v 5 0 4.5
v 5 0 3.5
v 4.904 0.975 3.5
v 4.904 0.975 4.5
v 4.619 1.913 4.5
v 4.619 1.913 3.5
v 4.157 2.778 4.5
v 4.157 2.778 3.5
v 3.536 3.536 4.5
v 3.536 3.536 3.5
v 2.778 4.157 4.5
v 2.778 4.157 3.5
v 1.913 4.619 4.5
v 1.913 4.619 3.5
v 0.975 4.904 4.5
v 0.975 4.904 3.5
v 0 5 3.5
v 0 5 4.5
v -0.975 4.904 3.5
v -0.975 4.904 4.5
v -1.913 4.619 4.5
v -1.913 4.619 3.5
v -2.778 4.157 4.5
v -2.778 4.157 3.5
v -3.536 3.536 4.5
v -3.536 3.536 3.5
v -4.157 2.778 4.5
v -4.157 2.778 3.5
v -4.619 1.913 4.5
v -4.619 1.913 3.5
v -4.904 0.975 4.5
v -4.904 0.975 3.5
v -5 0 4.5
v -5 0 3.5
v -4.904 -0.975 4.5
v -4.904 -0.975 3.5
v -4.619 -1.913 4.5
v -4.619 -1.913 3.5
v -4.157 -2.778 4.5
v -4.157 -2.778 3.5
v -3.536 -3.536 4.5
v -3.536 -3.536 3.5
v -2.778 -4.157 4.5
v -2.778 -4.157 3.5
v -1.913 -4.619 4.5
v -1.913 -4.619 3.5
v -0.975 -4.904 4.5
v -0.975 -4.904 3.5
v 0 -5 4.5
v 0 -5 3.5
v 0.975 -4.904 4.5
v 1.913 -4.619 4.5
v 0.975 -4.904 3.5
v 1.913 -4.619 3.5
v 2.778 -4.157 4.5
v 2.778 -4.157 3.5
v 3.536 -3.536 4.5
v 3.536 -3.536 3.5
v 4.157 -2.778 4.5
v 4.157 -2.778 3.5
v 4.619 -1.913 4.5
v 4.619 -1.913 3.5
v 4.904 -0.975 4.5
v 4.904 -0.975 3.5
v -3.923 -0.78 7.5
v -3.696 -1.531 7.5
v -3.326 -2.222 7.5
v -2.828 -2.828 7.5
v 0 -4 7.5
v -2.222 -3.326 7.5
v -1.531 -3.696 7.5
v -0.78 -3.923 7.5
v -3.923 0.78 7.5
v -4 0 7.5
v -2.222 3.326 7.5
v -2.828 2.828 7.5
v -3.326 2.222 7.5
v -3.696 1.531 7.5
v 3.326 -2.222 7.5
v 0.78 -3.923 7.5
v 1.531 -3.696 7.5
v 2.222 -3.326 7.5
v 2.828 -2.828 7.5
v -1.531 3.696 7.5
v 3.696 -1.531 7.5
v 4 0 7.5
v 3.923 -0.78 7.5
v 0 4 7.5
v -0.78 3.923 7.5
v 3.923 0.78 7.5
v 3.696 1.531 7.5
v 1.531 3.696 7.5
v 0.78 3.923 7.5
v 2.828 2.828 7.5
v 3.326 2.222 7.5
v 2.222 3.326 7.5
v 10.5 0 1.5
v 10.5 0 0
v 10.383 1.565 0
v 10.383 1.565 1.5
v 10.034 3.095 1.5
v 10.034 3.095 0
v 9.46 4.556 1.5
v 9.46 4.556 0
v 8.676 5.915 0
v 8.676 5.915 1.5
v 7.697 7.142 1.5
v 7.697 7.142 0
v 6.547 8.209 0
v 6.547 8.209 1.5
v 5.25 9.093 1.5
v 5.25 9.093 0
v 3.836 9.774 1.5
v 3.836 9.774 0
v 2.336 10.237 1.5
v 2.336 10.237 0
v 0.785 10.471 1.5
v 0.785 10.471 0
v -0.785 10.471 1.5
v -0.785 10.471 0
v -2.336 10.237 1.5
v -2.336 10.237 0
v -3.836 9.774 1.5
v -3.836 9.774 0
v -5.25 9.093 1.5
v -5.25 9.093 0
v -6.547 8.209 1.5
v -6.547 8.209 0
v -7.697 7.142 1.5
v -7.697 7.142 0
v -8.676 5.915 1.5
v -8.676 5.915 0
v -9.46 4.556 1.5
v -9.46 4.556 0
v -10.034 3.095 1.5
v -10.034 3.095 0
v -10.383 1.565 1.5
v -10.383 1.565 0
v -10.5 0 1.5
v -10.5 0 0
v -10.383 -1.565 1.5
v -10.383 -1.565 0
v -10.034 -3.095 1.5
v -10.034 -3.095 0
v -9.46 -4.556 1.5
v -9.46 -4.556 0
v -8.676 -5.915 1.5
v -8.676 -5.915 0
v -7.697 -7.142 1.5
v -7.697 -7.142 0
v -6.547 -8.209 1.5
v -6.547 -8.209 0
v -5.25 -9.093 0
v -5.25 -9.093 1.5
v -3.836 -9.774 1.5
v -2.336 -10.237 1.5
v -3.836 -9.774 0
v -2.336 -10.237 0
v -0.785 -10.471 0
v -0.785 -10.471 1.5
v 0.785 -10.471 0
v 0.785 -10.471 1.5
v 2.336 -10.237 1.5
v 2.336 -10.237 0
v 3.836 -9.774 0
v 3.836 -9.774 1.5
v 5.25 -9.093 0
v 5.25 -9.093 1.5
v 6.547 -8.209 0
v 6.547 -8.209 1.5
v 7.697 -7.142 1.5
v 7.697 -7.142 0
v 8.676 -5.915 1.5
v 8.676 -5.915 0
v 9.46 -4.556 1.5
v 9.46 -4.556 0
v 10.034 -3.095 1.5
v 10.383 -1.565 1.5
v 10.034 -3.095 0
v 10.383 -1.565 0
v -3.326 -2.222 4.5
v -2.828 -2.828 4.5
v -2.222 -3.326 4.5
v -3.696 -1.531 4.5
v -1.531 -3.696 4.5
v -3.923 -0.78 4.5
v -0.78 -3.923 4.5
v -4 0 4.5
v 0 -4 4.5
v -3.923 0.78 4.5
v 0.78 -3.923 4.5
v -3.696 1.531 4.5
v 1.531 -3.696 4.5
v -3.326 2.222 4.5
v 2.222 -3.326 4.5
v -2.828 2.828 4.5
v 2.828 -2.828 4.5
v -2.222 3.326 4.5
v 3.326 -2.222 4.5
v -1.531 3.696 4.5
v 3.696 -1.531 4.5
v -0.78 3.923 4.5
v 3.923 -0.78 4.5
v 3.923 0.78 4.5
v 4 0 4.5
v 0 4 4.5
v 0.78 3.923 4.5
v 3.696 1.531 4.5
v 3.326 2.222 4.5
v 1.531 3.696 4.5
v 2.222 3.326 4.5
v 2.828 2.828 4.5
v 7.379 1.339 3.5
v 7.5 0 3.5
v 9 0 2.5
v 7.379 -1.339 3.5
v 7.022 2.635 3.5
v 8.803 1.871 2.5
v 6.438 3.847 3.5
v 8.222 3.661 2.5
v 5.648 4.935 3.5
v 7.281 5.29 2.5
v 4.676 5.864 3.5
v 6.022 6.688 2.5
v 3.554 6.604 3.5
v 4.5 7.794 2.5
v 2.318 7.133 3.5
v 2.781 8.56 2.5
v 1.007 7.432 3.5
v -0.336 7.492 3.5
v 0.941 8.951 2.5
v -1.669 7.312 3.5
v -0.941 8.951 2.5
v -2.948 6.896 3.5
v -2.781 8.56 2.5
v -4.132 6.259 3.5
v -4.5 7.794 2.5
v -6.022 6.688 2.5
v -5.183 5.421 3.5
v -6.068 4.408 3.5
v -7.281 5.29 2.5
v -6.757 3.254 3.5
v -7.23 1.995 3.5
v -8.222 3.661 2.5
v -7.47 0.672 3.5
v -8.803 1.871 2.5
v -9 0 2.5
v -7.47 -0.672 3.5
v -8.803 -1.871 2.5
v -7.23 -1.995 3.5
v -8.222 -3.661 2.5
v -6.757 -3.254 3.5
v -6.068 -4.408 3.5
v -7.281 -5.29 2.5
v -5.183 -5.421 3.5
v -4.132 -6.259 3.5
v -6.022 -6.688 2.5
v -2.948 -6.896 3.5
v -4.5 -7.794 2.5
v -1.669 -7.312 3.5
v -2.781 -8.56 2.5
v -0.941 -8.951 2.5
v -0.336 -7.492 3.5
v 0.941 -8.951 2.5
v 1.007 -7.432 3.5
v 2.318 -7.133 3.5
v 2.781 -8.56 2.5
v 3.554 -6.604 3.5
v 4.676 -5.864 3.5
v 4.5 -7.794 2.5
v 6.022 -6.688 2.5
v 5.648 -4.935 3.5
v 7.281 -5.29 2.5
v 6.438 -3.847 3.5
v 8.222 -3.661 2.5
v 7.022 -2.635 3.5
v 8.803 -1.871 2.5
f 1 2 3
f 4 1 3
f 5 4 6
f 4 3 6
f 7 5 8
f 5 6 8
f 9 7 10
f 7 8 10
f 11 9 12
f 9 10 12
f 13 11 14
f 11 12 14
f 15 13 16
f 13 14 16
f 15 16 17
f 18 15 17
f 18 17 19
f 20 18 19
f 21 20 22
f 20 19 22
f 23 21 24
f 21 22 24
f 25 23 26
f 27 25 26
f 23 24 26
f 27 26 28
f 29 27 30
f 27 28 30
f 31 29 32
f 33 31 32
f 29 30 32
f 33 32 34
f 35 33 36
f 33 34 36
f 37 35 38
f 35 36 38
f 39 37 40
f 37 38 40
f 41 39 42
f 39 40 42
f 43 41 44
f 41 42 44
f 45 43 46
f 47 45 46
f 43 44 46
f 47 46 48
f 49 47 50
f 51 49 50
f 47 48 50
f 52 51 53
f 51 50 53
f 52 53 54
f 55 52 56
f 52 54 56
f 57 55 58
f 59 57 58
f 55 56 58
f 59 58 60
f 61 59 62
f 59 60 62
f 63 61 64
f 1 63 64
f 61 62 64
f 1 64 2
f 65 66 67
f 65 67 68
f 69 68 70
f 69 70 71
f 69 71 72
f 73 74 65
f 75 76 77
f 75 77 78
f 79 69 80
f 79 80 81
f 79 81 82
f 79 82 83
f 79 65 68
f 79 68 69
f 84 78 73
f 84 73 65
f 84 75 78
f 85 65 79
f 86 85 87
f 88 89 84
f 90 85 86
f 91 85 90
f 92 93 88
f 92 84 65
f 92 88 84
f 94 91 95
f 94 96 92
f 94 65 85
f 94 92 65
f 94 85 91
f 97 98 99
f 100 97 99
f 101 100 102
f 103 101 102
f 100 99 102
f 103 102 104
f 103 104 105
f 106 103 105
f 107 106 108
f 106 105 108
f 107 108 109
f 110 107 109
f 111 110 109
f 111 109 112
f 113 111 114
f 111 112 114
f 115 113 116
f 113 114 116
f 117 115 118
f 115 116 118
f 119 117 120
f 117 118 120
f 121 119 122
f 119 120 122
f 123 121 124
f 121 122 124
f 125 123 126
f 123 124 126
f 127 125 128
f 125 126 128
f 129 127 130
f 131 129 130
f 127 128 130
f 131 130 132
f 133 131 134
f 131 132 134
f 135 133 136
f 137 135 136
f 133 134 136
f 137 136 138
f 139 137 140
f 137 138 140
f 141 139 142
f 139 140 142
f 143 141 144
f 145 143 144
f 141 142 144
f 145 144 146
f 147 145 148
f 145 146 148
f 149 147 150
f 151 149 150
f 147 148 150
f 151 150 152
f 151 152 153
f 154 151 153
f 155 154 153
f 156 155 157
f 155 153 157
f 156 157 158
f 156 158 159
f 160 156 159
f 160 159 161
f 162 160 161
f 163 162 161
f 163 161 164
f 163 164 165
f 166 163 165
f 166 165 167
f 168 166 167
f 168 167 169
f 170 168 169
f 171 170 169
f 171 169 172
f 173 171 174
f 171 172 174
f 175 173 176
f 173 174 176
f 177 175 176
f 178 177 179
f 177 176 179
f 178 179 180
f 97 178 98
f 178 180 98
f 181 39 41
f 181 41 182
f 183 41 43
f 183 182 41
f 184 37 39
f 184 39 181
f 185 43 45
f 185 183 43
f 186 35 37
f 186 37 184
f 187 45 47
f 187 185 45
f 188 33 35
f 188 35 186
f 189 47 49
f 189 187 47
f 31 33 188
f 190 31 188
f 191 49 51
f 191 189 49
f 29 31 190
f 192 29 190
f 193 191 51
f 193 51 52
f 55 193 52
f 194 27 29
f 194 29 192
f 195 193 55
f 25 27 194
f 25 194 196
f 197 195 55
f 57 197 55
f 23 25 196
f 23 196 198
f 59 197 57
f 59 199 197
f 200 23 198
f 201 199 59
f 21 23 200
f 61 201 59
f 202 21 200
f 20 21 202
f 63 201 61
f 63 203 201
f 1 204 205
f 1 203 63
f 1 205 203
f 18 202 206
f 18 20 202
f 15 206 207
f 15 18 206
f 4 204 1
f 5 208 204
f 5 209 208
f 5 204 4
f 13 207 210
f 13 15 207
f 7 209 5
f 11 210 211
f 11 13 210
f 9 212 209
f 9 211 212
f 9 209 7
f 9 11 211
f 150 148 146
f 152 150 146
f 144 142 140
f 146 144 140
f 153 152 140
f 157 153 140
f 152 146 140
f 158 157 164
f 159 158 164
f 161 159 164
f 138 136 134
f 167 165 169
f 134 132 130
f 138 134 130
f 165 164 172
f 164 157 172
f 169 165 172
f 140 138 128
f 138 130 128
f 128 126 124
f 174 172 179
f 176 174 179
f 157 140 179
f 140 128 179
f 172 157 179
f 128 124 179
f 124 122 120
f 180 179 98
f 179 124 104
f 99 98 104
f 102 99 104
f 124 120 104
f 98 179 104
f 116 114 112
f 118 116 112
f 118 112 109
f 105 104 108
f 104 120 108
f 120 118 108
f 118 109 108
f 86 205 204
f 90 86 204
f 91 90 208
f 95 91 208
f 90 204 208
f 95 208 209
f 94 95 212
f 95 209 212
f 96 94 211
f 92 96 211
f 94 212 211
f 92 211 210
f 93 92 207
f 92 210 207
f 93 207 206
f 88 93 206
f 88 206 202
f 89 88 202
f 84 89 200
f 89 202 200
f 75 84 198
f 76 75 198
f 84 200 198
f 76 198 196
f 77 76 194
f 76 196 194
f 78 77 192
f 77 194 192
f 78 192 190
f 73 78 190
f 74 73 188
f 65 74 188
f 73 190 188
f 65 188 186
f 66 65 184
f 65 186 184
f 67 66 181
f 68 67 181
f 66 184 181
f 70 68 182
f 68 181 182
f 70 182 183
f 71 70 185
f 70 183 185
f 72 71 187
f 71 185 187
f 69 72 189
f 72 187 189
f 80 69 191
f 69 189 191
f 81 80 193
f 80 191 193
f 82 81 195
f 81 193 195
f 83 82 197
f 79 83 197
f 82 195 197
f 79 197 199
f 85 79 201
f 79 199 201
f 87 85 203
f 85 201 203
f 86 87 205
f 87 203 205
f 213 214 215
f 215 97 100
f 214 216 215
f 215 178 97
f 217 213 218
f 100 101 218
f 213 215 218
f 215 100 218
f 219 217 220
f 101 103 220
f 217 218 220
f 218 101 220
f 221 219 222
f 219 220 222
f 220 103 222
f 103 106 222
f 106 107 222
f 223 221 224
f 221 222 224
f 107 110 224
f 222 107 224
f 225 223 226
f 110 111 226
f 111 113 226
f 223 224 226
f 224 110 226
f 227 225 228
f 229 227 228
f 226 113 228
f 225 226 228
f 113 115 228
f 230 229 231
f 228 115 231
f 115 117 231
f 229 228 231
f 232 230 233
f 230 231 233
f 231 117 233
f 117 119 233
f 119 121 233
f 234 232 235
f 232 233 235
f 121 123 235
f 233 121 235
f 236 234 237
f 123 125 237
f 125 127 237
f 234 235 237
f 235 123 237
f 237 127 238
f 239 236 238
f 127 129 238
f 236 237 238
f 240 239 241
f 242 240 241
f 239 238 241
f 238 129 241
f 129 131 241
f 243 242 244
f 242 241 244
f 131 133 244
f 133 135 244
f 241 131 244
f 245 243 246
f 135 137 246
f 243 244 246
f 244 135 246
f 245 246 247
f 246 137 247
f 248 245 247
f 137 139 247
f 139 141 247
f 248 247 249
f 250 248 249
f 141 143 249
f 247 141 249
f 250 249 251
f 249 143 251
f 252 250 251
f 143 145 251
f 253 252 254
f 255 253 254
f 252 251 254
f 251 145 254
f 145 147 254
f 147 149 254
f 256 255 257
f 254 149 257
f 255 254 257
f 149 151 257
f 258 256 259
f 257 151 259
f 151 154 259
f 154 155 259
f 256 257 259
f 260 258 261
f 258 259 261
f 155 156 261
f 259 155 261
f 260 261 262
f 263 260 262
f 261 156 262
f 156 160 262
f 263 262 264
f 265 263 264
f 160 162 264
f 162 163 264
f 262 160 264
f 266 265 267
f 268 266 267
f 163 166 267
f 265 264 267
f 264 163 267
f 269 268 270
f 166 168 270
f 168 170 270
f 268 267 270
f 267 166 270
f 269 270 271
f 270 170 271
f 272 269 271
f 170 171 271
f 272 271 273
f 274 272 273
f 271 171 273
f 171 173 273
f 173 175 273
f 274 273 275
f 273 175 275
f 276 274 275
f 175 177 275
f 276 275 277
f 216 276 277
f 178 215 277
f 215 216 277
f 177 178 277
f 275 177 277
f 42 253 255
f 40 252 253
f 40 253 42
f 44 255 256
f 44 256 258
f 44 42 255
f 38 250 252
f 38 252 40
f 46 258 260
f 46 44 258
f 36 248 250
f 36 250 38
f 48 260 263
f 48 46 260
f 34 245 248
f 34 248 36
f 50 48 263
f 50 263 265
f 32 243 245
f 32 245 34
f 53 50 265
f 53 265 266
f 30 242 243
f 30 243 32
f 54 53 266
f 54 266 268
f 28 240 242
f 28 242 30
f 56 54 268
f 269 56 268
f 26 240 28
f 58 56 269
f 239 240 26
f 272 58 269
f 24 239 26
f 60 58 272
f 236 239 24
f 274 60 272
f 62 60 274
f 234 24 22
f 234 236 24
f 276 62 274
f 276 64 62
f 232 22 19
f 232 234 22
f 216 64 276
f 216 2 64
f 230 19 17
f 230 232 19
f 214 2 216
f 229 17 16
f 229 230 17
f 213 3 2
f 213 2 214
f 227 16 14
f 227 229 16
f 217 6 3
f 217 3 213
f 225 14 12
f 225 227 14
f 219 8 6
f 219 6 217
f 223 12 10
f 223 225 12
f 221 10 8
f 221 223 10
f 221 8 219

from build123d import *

# Parameters (mm, degrees)
F0_R     = 10.5
F1_DEPTH = 3.5
F2_R     = 5
F3_DEPTH = 1
F4_R     = 4
F5_DEPTH = 3
F6_SIZE2 = 2
F6_SIZE  = 3


with BuildPart() as f1:
    # F0 (on Top) → F1 (new body)
    with BuildSketch(Plane.XY):
        Circle(F0_R)
    extrude(amount=F1_DEPTH)

    # F2 (on face) → F3 (join)
    with BuildSketch(Plane.XY.offset(3.5)):
        Circle(F2_R)
    extrude(amount=F3_DEPTH)

    # F4 (on face) → F5 (join)
    with BuildSketch(Plane.XY.offset(4.5)):
        Circle(F4_R)
    extrude(amount=F5_DEPTH)

    # F6
    f6_edges = [f1.edges().sort_by_distance(p)[0] for p in [
        (-10.5, 0, 3.5),
    ]]
    f6_side = f1.faces().sort_by_distance((-10.203015, 0, 3.5))[0]
    chamfer(f6_edges, length=F6_SIZE, length2=F6_SIZE2, reference=f6_side)


solid = f1.part
